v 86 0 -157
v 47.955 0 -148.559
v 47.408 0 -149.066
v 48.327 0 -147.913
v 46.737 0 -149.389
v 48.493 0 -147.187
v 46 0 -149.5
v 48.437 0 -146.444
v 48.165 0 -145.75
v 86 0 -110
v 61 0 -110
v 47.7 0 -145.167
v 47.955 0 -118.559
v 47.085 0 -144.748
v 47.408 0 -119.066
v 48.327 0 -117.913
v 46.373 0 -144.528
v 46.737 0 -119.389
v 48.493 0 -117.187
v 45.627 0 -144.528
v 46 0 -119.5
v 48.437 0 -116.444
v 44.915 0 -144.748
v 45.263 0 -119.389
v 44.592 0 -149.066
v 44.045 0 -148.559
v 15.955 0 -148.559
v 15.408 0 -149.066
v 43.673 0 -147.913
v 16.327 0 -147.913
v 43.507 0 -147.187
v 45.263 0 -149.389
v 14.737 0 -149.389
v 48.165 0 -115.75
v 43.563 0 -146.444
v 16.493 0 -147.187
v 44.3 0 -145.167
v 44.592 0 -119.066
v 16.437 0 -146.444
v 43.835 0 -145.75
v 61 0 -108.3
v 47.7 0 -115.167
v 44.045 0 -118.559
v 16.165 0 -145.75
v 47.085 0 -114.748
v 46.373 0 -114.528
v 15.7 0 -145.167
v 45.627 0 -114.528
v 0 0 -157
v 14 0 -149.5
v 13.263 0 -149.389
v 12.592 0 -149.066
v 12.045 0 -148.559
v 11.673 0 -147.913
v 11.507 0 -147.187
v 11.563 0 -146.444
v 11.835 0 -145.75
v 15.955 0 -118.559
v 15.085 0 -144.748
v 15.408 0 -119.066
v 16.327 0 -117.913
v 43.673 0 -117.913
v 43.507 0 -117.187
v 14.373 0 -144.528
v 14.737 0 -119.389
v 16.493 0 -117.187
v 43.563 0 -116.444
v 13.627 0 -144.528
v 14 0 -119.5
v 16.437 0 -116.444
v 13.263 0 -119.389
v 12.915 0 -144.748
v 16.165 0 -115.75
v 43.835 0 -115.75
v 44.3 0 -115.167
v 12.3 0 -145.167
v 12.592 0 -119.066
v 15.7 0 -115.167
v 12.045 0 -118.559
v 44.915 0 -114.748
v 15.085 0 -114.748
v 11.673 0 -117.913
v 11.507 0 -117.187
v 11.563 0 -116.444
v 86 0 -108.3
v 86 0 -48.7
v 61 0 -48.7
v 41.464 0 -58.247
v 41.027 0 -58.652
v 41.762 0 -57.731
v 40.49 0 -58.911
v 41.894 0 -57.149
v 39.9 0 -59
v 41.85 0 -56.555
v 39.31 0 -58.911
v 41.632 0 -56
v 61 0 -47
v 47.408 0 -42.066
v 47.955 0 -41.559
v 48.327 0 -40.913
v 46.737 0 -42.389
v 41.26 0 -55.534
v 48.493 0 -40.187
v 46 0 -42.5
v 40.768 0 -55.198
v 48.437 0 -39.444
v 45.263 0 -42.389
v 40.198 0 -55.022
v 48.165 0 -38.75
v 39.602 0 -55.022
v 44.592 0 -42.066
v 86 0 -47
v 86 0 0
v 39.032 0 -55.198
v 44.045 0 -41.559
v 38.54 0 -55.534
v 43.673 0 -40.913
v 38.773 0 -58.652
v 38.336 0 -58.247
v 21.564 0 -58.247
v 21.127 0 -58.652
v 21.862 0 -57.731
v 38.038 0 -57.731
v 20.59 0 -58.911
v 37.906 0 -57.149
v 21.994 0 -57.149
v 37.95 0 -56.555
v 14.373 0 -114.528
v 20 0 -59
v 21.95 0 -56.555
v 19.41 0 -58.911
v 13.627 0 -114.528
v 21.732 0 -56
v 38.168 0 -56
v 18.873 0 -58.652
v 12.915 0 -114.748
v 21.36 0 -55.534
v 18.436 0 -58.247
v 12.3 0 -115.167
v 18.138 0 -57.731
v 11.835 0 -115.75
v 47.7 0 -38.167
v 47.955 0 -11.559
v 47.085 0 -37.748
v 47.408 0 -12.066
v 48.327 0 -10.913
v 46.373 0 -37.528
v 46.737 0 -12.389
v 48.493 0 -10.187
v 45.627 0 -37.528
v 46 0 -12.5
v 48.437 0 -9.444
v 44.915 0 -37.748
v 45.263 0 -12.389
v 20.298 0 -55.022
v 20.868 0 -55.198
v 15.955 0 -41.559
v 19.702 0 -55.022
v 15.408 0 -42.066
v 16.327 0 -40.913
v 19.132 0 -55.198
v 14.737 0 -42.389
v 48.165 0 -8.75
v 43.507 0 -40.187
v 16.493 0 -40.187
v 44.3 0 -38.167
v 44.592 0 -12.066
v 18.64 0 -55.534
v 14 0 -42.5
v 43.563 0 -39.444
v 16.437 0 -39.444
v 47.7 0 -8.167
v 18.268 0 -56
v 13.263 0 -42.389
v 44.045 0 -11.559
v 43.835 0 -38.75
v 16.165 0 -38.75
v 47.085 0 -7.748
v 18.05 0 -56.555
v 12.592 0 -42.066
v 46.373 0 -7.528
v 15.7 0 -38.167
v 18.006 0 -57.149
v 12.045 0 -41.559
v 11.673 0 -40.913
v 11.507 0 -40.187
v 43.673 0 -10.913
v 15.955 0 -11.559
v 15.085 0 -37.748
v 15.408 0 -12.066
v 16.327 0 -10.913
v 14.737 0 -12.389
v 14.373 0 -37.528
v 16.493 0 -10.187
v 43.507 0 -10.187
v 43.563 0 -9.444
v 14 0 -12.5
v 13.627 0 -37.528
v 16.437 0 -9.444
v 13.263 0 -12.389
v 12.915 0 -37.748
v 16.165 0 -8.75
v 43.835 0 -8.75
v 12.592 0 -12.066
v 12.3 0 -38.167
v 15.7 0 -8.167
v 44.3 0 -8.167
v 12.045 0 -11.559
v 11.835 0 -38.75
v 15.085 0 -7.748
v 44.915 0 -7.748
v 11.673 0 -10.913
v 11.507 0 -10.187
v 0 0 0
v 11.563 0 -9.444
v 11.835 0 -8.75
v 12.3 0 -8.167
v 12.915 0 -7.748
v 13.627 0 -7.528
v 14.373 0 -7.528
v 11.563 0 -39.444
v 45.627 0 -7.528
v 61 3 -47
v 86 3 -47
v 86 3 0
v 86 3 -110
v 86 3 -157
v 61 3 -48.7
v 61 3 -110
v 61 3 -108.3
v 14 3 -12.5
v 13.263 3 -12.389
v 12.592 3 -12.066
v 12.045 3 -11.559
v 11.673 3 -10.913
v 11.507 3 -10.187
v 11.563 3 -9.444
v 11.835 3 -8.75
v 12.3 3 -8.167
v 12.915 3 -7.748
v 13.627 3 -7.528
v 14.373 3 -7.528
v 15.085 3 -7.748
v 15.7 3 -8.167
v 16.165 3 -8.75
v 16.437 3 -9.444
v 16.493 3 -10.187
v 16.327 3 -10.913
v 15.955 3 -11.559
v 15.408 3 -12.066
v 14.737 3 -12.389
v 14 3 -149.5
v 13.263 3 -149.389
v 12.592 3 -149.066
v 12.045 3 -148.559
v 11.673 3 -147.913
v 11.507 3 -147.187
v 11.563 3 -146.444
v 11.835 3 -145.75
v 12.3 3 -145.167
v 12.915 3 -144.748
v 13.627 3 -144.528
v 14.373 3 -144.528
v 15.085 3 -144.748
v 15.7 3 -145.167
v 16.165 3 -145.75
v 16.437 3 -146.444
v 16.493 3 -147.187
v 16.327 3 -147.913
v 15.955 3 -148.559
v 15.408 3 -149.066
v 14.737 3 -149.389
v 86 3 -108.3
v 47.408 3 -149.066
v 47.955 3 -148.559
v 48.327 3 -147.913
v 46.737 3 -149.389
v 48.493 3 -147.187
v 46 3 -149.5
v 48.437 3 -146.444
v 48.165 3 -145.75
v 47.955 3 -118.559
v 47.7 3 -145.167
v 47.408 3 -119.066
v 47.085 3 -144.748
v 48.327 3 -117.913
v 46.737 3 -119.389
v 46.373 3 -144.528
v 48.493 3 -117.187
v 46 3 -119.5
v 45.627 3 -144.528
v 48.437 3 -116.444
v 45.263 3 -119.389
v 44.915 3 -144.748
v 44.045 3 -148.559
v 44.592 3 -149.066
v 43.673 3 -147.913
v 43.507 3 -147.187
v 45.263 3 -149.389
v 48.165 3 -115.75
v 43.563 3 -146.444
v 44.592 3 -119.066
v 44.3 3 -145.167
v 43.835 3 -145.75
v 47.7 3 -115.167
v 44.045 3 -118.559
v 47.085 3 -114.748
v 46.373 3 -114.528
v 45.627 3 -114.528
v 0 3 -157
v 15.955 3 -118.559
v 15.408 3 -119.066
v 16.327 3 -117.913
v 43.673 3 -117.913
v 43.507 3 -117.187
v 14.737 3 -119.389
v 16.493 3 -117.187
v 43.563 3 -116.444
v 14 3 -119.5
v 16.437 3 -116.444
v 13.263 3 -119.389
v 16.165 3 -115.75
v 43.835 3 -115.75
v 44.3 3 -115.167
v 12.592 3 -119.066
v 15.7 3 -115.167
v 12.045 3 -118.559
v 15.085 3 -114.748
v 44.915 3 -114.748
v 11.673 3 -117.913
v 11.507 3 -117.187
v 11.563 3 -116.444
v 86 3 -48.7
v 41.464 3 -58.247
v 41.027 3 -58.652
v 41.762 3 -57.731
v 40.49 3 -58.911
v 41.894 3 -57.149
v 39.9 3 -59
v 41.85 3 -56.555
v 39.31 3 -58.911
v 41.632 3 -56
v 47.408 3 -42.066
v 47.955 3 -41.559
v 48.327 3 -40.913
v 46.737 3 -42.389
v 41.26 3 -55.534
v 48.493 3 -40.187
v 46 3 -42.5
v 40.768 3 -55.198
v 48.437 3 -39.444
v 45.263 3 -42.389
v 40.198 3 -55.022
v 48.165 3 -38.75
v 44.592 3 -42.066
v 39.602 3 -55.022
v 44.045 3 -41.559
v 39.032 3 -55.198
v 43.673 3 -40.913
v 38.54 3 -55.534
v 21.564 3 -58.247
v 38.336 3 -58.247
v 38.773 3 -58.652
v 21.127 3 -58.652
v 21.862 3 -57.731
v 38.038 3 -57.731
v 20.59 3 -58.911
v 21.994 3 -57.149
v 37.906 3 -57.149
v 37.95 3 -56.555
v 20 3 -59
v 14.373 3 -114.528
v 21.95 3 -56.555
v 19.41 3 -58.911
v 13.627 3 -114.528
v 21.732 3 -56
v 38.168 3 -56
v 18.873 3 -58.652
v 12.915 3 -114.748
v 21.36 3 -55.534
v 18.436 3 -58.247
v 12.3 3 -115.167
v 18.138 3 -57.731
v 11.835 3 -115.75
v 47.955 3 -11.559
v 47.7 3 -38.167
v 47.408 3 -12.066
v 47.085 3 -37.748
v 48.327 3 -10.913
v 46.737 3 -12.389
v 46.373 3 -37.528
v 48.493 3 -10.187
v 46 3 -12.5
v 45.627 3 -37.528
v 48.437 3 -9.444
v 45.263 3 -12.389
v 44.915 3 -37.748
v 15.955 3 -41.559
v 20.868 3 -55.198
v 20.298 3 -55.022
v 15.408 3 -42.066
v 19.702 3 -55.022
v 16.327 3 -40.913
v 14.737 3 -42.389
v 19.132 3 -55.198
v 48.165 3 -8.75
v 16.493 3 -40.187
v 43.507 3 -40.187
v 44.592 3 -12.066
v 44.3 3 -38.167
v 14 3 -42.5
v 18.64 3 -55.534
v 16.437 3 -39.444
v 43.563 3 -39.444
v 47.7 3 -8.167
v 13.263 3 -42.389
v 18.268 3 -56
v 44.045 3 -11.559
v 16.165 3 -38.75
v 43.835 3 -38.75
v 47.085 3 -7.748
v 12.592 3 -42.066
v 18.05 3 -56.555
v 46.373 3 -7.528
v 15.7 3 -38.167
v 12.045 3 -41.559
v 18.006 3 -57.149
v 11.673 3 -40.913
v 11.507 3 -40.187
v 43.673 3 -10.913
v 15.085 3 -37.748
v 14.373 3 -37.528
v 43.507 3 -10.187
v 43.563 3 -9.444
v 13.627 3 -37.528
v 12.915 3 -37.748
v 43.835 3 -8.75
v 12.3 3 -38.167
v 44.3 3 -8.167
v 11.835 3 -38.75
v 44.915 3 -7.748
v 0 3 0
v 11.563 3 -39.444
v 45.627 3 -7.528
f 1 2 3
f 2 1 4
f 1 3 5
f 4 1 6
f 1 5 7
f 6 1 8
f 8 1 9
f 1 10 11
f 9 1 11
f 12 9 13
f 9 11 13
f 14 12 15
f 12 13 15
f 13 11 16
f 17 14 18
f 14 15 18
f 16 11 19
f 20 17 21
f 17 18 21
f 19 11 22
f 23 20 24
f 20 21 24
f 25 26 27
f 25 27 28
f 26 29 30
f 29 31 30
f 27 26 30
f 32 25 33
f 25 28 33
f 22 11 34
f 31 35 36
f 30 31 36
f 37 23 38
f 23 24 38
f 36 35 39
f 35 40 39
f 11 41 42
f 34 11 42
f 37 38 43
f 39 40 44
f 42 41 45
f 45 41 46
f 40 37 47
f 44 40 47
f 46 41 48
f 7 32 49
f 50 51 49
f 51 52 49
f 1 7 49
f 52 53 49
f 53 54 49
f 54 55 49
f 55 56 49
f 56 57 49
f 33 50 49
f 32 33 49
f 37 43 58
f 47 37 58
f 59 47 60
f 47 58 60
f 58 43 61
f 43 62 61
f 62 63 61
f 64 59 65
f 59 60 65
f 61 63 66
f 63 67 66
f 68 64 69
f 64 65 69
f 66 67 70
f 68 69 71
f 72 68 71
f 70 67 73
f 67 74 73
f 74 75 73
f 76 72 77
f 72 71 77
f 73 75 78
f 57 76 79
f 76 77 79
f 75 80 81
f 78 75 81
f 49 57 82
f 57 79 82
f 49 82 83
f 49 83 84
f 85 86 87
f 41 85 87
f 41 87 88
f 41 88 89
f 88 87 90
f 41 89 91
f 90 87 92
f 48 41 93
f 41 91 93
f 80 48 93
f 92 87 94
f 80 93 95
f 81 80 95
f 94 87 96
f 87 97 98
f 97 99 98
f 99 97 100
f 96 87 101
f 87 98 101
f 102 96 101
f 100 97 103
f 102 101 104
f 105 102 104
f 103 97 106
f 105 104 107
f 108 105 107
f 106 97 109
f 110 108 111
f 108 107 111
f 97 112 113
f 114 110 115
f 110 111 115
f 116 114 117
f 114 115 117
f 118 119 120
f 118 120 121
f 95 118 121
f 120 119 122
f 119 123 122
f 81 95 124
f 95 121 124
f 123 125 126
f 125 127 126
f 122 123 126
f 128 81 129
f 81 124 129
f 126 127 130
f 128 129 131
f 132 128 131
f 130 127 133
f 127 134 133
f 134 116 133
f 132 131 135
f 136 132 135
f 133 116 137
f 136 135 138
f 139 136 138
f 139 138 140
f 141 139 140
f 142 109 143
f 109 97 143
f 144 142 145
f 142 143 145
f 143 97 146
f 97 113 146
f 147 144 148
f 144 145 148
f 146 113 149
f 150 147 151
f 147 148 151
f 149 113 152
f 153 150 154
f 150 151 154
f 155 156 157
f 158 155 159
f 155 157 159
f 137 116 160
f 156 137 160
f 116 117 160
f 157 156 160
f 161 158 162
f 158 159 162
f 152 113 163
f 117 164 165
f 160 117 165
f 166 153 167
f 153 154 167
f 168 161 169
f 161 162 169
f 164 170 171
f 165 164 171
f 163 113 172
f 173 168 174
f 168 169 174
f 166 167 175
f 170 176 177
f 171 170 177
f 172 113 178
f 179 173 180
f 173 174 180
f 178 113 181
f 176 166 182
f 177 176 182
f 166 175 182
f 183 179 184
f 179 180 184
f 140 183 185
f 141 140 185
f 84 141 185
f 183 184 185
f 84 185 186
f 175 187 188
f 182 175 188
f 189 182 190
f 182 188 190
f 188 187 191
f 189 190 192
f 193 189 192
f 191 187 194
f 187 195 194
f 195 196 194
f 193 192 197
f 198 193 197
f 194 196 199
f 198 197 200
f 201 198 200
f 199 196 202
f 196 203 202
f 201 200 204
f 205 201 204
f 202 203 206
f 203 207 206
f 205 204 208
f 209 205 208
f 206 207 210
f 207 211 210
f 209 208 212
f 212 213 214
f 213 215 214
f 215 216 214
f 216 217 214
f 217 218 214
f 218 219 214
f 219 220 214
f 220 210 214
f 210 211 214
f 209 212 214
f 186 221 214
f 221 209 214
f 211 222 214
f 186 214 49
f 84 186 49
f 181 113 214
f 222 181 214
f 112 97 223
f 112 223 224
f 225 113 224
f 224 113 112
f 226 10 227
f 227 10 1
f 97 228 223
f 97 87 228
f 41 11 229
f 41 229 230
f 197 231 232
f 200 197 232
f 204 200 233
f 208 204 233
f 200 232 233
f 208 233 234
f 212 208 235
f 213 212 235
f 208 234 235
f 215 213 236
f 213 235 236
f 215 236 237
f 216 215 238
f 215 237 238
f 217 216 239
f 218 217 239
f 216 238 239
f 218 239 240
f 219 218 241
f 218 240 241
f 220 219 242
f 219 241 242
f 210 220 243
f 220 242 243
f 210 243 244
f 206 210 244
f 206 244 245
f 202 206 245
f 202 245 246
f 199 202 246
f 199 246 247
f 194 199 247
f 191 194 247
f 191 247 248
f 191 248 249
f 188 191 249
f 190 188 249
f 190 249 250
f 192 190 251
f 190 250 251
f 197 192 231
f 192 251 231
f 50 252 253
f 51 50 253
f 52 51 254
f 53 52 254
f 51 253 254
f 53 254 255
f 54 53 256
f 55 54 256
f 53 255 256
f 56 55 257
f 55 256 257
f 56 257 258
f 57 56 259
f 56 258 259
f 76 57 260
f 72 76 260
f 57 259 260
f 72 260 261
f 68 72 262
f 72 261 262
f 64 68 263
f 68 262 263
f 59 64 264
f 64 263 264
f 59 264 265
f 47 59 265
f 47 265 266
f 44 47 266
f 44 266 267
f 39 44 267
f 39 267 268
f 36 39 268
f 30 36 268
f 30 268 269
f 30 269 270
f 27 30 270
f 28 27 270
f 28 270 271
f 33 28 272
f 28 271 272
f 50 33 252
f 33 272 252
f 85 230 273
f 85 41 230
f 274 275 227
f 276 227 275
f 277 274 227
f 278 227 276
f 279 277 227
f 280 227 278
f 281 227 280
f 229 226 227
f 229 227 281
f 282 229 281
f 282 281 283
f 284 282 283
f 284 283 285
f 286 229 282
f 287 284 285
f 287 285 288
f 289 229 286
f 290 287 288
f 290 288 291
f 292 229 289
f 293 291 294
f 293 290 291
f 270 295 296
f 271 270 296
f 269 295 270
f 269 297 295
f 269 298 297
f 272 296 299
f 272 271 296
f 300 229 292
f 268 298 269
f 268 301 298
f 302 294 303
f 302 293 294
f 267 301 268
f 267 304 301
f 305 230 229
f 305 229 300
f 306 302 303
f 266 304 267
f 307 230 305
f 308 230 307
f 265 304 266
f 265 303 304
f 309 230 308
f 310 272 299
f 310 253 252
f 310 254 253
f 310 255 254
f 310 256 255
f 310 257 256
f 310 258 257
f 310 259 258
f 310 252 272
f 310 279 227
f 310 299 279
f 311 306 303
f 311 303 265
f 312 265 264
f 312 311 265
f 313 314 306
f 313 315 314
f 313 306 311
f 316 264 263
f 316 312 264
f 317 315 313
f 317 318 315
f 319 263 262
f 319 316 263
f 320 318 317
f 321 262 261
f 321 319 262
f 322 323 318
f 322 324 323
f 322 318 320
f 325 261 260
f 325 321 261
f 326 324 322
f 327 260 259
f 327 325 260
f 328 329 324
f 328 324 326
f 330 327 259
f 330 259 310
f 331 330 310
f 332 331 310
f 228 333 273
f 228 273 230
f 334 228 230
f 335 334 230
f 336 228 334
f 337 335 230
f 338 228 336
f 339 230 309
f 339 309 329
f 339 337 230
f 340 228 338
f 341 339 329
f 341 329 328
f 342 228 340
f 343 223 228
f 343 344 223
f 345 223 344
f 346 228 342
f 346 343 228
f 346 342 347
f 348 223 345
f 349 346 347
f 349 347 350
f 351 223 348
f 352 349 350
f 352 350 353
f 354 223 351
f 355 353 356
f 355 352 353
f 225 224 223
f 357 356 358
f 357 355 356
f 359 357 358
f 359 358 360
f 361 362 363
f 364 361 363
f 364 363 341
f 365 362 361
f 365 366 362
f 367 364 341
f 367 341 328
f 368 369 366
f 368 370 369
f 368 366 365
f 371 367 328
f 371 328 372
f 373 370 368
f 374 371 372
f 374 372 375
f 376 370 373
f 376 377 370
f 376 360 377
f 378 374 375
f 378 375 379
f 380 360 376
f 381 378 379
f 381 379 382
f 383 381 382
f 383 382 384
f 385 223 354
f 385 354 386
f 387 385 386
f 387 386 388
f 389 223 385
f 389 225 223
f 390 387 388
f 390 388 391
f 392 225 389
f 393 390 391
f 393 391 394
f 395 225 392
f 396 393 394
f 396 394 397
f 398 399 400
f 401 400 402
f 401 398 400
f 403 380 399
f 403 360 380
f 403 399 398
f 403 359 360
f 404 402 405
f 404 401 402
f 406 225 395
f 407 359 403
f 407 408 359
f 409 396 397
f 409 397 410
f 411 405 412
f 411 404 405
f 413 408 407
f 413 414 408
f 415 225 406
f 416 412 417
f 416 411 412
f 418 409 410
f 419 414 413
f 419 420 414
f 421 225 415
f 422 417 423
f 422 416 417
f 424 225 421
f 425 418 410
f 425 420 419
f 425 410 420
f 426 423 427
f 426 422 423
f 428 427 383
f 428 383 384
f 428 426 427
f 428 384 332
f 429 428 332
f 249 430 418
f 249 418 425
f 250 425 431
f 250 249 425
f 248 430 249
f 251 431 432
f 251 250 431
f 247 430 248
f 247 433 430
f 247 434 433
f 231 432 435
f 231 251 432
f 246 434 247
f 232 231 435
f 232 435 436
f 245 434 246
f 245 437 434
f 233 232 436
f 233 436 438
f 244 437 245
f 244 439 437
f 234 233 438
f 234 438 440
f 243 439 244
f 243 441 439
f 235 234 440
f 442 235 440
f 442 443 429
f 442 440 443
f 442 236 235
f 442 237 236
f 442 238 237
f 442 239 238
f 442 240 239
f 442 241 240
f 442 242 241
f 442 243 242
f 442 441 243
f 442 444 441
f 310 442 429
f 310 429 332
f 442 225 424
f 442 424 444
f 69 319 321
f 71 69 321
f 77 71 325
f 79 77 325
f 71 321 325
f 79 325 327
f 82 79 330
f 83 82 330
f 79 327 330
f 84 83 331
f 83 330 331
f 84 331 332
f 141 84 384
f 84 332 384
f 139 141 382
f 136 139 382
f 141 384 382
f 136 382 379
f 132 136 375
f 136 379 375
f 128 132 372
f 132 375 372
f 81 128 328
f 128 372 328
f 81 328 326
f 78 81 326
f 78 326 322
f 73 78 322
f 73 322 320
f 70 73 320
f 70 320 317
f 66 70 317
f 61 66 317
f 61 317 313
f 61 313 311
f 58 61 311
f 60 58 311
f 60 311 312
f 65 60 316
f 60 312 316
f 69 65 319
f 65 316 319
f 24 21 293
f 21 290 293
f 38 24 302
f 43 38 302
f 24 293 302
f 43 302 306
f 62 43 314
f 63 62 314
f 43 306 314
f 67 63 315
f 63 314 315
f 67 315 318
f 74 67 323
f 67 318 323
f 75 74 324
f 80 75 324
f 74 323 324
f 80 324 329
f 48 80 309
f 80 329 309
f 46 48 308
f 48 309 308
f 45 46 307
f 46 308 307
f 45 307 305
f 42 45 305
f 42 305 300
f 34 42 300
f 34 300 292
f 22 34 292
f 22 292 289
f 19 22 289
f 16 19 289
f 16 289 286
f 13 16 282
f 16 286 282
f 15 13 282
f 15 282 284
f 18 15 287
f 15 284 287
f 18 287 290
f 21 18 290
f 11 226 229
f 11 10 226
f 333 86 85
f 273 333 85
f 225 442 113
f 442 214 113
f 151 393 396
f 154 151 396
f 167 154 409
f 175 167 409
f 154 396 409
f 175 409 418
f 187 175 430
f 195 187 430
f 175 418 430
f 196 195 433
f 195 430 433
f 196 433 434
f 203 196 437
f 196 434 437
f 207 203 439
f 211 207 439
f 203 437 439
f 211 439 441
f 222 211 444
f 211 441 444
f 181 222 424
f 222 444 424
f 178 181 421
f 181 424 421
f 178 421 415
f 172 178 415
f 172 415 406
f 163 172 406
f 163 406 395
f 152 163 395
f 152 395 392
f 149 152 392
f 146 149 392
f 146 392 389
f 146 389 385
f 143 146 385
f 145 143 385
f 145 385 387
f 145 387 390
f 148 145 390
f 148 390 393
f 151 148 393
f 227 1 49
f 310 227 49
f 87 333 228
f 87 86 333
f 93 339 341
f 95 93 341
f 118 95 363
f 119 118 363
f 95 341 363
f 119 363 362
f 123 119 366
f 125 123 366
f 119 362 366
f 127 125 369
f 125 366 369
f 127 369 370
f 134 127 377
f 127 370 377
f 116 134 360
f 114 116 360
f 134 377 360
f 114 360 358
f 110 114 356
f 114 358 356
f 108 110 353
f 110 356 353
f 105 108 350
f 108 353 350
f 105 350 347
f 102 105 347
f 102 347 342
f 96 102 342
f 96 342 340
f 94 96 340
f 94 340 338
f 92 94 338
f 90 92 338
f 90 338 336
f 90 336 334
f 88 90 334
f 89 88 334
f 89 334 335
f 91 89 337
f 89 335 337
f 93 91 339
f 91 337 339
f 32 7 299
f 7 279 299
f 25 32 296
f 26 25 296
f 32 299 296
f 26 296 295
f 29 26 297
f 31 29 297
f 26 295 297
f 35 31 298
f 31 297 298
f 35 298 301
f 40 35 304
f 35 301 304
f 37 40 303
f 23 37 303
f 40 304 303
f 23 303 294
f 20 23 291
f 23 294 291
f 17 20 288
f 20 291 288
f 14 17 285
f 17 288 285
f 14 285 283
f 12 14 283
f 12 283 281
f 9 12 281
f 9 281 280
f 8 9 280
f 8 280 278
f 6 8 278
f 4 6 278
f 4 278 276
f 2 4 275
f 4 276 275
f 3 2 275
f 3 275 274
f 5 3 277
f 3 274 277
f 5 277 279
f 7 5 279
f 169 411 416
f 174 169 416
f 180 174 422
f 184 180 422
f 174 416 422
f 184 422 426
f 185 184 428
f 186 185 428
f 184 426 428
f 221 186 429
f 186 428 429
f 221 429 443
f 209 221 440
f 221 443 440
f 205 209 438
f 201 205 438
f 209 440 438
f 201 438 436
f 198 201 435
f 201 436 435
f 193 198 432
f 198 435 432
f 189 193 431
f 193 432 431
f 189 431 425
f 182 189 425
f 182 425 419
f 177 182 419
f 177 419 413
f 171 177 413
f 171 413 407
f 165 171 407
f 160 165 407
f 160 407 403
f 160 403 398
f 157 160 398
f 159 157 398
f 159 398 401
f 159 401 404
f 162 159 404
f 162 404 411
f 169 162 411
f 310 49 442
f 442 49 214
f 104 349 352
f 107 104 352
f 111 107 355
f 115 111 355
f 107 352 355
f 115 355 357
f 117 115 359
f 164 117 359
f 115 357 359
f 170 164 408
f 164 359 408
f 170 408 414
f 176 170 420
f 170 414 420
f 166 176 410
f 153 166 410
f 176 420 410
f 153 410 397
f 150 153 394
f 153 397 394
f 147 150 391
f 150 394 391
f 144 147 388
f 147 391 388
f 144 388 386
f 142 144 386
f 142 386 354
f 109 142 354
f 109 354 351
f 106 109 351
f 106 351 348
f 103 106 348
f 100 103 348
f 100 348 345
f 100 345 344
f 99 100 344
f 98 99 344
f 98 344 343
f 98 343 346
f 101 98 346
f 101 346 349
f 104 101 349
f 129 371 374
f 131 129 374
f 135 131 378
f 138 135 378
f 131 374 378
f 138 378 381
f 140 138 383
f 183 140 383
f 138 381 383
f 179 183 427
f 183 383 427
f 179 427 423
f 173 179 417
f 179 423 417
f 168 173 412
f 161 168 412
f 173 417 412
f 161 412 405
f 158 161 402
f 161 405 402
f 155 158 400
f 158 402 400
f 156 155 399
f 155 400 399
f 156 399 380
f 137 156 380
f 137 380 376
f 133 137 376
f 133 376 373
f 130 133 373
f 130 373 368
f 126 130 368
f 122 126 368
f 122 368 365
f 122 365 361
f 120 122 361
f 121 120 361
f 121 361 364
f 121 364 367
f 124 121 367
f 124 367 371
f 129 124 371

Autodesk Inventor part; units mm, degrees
ref_plane "YZ Plane" through (0, 0, 0) normal (1, 0, 0) x (0, 1, 0)
ref_plane "XZ Plane" through (0, 0, 0) normal (0, 1, 0) x (-1, 0, 0)
ref_plane "XY Plane" through (0, 0, 0) normal (0, 0, 1) x (1, 0, 0)
sketch "Sketch1" plane through (0, 0, 0) normal (0, 1, 0) x (-1, 0, 0)
  line L0 (0, 0) -> (-86, 0)
  line L1 (-86, 0) -> (-86, -157)
  line L2 (-86, -157) -> (0, -157)
  line L3 (0, -157) -> (0, 0)
  line L4 (-14, -40) -> (-46, -40) construction
  line L5 (-46, -40) -> (-46, -10) construction
  line L6 (-46, -10) -> (-14, -10) construction
  line L7 (-14, -10) -> (-14, -40) construction
  line L8 (-14, -147) -> (-46, -147) construction
  line L9 (-46, -147) -> (-46, -117) construction
  line L10 (-46, -117) -> (-14, -117) construction
  line L11 (-14, -117) -> (-14, -147) construction
  line L12 (-86, -110) -> (-61, -110)
  line L13 (-61, -110) -> (-61, -108.3)
  line L14 (-61, -108.3) -> (-86, -108.3)
  line L15 (-86, -48.7) -> (-61, -48.7)
  line L16 (-61, -48.7) -> (-61, -47)
  line L17 (-61, -47) -> (-86, -47)
  line L18 (-20, -57) -> (-39.9, -57) construction
  dimension "d0" = 86
  dimension "d1" = 157
  dimension "d2" = 32
  dimension "d3" = 30
  dimension "d4" = 14
  dimension "d5" = 10
  dimension "d6" = 32
  dimension "d7" = 30
  dimension "d8" = 10
  dimension "d9" = 14
  dimension "d10" = 1.7
  dimension "d11" = 1.7
  dimension "d13" = 47
  dimension "d15" = 25
  dimension "d16" = 47
  dimension "d26" = 19.9
  dimension "d27" = 20
  dimension "d28" = 57
extrude "Extrusion1" add sketch "Sketch1" along normal blind 3 contours L3 L2 L1 L12 L13 L14 L15 L16 L17 L0
hole "Hole1" at (14, 0, -40) at (46, 0, -40) at (46, 0, -10) at (14, 0, -10) at (14, 0, -147) at (46, 0, -117) at (14, 0, -117) at (46, 0, -147) direction (0, 1, 0) diameter 5 end through all
hole "Hole2" at (20, 0, -57) at (39.9, 0, -57) direction (0, 1, 0) diameter 4 end through all
properties part number "X Axis Base Plate Accurate_3DPrint"
